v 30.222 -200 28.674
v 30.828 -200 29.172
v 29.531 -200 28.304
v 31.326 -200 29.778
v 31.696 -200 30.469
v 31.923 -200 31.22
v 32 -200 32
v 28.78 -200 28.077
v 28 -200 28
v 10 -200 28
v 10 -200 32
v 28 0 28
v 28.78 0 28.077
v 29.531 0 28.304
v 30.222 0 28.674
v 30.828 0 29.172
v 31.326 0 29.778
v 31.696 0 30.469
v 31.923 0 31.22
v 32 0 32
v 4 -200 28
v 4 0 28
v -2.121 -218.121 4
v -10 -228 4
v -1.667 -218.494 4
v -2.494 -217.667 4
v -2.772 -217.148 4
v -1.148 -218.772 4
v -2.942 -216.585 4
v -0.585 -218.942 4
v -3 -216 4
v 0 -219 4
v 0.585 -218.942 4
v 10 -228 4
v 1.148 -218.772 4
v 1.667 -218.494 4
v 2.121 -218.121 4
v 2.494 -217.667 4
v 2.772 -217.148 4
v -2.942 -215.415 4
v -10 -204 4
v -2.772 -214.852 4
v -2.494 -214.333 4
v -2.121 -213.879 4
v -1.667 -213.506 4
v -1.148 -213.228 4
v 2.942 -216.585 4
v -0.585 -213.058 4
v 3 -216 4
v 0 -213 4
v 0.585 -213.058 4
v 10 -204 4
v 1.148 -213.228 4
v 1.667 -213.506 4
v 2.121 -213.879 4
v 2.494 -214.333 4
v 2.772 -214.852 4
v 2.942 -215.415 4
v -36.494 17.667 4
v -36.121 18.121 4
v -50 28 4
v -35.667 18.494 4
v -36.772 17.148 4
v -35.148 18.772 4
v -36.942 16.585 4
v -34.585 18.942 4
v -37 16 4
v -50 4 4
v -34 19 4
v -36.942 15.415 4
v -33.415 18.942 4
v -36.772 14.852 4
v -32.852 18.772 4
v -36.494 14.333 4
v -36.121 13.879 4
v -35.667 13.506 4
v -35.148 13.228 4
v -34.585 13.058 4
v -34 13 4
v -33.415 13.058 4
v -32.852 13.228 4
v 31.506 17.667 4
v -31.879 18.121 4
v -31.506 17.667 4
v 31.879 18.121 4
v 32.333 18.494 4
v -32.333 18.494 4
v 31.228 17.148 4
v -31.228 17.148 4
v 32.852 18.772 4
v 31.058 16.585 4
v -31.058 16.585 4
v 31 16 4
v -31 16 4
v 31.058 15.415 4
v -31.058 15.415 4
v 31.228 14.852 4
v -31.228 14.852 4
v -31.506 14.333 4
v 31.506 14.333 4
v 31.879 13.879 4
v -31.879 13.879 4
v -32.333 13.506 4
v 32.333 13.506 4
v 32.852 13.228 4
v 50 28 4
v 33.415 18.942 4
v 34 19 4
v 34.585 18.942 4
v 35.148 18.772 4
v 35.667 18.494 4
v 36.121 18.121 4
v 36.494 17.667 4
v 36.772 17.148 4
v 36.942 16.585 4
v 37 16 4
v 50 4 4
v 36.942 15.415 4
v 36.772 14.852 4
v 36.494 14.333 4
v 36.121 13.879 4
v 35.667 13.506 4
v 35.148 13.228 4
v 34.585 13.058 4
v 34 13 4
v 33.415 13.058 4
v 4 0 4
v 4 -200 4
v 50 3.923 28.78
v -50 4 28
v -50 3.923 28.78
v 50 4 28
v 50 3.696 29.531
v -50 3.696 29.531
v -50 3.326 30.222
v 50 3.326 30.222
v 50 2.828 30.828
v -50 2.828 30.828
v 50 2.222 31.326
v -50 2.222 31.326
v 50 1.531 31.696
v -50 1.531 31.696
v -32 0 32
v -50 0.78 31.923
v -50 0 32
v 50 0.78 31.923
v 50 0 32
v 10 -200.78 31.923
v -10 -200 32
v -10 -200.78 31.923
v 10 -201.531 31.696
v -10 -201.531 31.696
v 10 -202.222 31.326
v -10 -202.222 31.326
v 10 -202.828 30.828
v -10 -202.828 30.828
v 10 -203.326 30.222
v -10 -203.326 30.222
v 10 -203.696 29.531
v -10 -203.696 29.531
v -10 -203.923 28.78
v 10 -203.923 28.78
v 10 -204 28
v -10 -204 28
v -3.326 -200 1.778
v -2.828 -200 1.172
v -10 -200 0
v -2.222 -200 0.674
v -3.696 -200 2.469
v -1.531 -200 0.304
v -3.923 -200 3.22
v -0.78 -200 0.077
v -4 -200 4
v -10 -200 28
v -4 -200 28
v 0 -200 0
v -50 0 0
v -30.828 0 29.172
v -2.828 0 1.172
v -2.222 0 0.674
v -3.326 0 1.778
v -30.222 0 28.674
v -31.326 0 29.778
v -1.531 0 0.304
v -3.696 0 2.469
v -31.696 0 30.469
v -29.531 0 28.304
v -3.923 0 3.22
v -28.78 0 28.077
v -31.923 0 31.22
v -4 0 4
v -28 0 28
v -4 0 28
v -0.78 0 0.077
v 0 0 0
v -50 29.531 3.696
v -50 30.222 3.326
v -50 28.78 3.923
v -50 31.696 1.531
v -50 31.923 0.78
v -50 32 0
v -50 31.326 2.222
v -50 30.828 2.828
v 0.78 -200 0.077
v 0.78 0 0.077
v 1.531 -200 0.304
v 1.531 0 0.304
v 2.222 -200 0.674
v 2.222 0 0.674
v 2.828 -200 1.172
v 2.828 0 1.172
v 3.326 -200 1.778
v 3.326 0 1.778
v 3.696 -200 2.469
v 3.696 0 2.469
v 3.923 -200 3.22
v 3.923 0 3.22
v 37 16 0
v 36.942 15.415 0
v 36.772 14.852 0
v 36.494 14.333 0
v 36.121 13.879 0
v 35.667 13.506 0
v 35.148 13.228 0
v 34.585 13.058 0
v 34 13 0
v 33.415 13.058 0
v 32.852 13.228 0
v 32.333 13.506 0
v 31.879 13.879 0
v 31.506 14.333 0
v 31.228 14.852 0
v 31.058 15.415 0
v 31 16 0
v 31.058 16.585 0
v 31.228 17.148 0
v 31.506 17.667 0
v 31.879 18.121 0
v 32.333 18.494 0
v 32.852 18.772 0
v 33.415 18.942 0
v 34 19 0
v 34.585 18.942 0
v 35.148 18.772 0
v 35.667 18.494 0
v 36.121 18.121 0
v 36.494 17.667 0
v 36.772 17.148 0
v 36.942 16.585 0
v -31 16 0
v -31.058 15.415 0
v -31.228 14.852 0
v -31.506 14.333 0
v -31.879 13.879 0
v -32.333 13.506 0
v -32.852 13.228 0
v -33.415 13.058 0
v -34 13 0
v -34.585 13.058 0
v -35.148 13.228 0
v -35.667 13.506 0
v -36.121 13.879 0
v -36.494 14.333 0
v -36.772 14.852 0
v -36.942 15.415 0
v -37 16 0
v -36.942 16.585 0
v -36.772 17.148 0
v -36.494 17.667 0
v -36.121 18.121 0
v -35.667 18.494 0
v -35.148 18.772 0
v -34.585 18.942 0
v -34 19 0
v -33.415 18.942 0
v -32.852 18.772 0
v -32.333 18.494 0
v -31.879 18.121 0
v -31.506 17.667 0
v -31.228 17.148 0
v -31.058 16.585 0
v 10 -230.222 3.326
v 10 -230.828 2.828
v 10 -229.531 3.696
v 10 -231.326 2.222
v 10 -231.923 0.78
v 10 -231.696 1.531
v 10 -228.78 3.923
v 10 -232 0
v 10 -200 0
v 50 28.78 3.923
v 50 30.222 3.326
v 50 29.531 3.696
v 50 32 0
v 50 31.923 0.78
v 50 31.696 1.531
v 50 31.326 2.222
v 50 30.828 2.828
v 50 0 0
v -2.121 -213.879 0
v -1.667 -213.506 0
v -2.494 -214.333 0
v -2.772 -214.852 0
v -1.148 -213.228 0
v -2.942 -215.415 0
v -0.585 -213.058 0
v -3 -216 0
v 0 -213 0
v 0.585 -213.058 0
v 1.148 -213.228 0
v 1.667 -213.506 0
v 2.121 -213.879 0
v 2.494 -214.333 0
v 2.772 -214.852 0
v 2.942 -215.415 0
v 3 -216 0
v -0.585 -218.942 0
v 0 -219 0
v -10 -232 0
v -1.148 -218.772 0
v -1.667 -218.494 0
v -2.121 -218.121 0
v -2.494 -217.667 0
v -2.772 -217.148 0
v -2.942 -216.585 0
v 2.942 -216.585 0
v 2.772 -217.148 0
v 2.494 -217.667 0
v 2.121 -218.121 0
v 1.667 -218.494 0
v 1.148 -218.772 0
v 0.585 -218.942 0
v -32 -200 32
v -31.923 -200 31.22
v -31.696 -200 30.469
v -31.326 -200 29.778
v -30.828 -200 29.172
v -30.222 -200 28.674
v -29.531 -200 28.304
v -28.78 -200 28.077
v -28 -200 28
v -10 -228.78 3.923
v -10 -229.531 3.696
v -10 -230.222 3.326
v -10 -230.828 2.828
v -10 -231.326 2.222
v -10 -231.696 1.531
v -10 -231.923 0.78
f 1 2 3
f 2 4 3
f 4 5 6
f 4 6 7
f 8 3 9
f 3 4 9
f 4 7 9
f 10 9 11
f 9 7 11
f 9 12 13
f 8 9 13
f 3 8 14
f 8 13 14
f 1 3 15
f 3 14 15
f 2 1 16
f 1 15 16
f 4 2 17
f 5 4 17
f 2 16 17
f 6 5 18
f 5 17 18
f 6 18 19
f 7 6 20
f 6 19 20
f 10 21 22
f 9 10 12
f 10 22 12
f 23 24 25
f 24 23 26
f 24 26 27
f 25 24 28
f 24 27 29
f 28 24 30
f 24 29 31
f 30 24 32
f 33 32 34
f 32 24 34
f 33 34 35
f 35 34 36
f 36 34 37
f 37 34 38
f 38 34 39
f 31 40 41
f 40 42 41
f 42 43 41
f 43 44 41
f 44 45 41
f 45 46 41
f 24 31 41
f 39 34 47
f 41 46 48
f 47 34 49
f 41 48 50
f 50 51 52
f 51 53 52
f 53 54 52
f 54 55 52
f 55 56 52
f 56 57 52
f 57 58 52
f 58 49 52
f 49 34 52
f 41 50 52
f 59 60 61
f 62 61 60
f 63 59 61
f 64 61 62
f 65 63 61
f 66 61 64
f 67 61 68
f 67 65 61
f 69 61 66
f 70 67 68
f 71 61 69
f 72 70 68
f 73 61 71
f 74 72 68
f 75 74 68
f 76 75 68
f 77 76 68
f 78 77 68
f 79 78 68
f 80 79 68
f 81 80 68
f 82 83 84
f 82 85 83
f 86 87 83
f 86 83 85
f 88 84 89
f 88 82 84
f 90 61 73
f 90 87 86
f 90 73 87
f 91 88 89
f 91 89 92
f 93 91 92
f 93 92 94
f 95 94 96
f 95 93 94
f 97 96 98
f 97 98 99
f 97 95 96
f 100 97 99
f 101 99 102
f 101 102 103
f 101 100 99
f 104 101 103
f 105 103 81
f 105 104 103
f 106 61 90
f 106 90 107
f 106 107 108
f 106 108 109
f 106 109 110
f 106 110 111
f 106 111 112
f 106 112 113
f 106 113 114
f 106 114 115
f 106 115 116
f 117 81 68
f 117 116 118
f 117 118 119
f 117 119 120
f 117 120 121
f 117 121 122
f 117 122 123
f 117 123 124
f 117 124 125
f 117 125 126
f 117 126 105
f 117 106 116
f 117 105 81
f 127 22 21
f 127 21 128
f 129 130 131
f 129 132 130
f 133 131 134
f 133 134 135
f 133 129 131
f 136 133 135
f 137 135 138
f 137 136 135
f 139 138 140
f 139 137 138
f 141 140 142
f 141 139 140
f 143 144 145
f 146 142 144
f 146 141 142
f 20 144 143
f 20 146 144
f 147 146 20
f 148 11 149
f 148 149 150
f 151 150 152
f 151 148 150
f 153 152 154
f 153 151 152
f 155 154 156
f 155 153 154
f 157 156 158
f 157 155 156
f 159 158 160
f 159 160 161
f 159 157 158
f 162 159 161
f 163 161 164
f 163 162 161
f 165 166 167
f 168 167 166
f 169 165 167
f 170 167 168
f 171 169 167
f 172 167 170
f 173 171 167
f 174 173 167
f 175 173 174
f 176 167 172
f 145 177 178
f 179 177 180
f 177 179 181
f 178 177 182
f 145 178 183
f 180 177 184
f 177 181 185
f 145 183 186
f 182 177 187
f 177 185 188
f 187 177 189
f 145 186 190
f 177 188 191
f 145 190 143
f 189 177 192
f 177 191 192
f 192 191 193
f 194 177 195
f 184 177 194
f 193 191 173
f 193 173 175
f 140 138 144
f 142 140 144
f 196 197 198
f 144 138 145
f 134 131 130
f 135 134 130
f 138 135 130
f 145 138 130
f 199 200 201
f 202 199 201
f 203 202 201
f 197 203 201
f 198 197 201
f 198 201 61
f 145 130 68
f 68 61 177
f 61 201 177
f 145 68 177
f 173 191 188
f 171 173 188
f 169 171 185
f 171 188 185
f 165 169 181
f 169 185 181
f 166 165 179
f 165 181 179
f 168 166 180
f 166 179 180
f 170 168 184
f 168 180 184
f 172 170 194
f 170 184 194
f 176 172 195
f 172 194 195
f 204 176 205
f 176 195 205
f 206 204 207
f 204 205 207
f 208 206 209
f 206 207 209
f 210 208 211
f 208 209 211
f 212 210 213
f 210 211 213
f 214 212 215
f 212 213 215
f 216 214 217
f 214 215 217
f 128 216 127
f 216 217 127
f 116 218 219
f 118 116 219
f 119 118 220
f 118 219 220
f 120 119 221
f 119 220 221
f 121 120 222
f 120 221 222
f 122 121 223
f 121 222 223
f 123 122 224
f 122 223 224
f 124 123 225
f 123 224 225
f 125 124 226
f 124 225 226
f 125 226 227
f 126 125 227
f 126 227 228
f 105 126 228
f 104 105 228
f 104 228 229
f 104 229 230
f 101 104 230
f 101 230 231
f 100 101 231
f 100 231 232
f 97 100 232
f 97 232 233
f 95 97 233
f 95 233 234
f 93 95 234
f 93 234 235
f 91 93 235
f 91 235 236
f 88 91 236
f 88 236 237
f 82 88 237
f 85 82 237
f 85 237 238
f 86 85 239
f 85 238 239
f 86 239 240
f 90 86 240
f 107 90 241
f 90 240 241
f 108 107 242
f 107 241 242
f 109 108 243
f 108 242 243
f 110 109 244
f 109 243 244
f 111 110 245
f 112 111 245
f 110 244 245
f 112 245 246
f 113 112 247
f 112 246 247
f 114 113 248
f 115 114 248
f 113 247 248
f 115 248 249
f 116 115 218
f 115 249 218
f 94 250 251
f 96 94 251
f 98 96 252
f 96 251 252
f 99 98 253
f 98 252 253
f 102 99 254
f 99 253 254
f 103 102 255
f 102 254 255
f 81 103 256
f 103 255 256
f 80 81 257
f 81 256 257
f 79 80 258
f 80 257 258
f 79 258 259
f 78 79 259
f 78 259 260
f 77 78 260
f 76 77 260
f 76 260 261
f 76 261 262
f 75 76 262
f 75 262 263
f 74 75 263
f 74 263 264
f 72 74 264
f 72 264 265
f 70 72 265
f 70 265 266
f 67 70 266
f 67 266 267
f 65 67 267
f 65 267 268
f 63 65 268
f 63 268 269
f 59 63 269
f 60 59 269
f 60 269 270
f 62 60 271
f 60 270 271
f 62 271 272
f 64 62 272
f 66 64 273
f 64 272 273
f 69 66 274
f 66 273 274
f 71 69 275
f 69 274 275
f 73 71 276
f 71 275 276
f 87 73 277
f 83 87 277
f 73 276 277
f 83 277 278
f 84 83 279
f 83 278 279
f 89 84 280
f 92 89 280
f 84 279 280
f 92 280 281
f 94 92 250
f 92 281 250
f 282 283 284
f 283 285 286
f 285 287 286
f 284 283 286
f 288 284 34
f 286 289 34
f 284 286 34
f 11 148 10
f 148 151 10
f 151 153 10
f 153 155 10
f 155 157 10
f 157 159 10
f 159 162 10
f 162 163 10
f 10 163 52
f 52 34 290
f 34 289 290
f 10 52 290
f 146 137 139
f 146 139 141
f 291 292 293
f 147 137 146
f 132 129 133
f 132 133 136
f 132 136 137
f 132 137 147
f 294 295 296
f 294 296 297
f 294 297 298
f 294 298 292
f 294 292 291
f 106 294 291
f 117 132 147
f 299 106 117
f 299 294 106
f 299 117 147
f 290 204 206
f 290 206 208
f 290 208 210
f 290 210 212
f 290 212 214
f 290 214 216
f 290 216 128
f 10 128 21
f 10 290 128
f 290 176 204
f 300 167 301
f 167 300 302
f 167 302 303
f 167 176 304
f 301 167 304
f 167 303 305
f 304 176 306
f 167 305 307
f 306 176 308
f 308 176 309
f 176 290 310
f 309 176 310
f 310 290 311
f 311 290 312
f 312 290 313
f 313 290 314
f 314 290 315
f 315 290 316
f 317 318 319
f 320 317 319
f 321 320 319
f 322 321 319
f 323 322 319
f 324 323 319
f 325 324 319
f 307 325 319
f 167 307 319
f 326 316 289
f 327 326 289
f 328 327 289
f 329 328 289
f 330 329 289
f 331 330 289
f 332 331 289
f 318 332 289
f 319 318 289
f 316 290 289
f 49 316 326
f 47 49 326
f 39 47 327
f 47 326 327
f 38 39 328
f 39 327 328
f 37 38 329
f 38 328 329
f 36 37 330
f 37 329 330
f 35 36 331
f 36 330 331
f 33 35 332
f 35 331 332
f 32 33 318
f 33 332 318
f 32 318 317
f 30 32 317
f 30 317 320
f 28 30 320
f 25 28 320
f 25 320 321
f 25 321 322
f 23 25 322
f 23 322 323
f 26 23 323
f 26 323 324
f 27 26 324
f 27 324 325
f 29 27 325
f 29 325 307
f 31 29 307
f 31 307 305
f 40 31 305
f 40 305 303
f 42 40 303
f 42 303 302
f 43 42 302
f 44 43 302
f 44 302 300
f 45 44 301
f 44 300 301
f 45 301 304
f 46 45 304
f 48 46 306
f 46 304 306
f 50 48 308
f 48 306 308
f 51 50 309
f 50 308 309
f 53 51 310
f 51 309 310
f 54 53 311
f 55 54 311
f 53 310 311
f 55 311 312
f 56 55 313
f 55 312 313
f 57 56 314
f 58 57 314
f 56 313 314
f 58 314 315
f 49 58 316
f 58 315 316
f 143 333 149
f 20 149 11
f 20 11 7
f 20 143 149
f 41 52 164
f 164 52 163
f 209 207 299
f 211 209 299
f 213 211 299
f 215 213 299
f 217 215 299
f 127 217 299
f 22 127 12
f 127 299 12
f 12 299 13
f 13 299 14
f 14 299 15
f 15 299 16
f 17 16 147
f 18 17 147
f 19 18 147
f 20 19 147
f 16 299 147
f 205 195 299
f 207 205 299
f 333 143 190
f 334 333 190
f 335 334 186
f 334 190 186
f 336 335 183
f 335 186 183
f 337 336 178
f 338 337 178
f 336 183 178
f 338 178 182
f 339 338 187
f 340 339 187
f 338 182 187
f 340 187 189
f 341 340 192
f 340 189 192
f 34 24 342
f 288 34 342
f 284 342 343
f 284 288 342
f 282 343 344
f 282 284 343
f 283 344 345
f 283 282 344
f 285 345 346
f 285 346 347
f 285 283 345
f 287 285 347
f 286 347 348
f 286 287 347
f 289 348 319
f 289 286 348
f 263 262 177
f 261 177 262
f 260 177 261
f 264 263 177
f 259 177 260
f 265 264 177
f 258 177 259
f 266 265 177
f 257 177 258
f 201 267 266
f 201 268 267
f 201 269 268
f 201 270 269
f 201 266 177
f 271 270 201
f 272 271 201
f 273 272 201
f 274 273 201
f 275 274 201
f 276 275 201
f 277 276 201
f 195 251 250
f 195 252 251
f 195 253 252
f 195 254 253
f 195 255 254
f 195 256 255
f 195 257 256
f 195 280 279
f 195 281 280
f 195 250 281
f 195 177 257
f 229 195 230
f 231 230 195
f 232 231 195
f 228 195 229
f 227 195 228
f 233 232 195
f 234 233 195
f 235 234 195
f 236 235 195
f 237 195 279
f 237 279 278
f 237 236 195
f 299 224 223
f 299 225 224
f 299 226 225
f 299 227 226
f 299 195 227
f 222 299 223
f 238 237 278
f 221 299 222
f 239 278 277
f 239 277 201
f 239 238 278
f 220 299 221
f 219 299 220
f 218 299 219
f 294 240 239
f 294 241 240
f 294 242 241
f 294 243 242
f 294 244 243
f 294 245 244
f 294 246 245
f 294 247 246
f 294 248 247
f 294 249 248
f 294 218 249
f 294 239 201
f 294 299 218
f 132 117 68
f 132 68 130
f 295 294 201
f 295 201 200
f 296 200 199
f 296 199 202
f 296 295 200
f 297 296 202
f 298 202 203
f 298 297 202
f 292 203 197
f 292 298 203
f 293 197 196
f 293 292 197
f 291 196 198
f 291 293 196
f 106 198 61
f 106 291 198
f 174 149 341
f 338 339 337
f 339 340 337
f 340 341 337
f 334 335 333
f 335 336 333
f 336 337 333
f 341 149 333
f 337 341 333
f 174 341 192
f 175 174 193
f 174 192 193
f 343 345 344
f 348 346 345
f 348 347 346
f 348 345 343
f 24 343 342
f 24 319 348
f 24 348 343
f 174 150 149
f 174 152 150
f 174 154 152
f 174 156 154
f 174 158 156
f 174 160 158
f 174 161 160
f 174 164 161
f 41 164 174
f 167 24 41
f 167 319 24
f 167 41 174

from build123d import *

# Parameters (mm, degrees)
PAD_DEPTH      = 200
PAD001_DEPTH   = 10
PAD002_DEPTH   = 50
SKETCH003_R    = 3
HOLE_DEPTH     = 25
HOLE_TIPS_R    = 3
SKETCH004_R    = 3
HOLE001_DEPTH  = 25
HOLE001_TIPS_R = 3


with BuildPart() as part:
    # Sketch → Pad (new body)
    with BuildSketch(Plane.XZ):
        with BuildLine():
            Line((-32, 32), (32, 32))
            ThreePointArc((28, 28), (30.828427, 29.171573), (32, 32))
            Line((4, 28), (28, 28))
            Line((4, 28), (4, 4))
            ThreePointArc((-4, 4), (0, 0), (4, 4))
            Line((-4, 4), (-4, 28))
            Line((-28, 28), (-4, 28))
            ThreePointArc((-32, 32), (-30.828427, 29.171573), (-28, 28))
        make_face()
    extrude(amount=PAD_DEPTH)

    # Sketch001 (on DatumPlane) → Pad001 (join, symmetric)
    with BuildSketch(Plane(origin=(0, 0, 0), x_dir=(0, -1, 0), z_dir=(1, 0, 0))):
        with BuildLine():
            Line((200, 0), (232, 0))
            ThreePointArc((228, -4), (230.828427, -2.828427), (232, 0))
            Line((228, -4), (204, -4))
            Line((204, -4), (204, -28))
            ThreePointArc((200, -32), (202.828427, -30.828427), (204, -28))
            Line((200, 0), (200, -32))
        make_face()
    extrude(amount=PAD001_DEPTH, both=True)

    # Sketch002 (on DatumPlane) → Pad002 (join, symmetric)
    with BuildSketch(Plane(origin=(0, 0, 0), x_dir=(0, -1, 0), z_dir=(1, 0, 0))):
        with BuildLine():
            Line((0, 0), (-32, 0))
            ThreePointArc((-32, 0), (-30.828427, -2.828427), (-28, -4))
            Line((-28, -4), (-4, -4))
            Line((-4, -4), (-4, -28))
            ThreePointArc((-4, -28), (-2.828427, -30.828427), (0, -32))
            Line((0, 0), (0, -32))
        make_face()
    extrude(amount=PAD002_DEPTH, both=True)

    # Sketch003 (on Face22 of Pad002) → Hole (cut)
    with BuildSketch(Plane(origin=(0, 0, 0), x_dir=(1, 0, 0), z_dir=(0, 0, -1))):
        with Locations((0, 216)):
            Circle(SKETCH003_R)
    extrude(amount=-HOLE_DEPTH, mode=Mode.SUBTRACT)

    # Hole tips → Hole tip 1 section 0
    with BuildSketch(Plane(origin=(0, 0, 25), x_dir=(1, 0, 0), z_dir=(0, 0, -1)), mode=Mode.PRIVATE) as hole_tip_1_s0:
        with Locations((0, 216)):
            Circle(HOLE_TIPS_R)
    loft([hole_tip_1_s0.sketch, Vertex(0, -216, 26.802582)], mode=Mode.SUBTRACT)

    # Sketch004 (on Face14 of Hole) → Hole001 (cut)
    with BuildSketch(Plane(origin=(0, 0, 0), x_dir=(1, 0, 0), z_dir=(0, 0, -1))):
        with Locations((34, -16)):
            Circle(SKETCH004_R)
        with Locations((-34, -16)):
            Circle(SKETCH004_R)
    extrude(amount=-HOLE001_DEPTH, mode=Mode.SUBTRACT)

    # Hole001 tips → Hole001 tip 1 section 0
    with BuildSketch(Plane(origin=(0, 0, 25), x_dir=(1, 0, 0), z_dir=(0, 0, -1)), mode=Mode.PRIVATE) as hole001_tip_1_s0:
        with Locations((34, -16)):
            Circle(HOLE001_TIPS_R)
    loft([hole001_tip_1_s0.sketch, Vertex(34, 16, 26.802582)], mode=Mode.SUBTRACT)

    # Hole001 tips → Hole001 tip 2 section 0
    with BuildSketch(Plane(origin=(0, 0, 25), x_dir=(1, 0, 0), z_dir=(0, 0, -1)), mode=Mode.PRIVATE) as hole001_tip_2_s0:
        with Locations((-34, -16)):
            Circle(HOLE001_TIPS_R)
    loft([hole001_tip_2_s0.sketch, Vertex(-34, 16, 26.802582)], mode=Mode.SUBTRACT)


solid = part.part
